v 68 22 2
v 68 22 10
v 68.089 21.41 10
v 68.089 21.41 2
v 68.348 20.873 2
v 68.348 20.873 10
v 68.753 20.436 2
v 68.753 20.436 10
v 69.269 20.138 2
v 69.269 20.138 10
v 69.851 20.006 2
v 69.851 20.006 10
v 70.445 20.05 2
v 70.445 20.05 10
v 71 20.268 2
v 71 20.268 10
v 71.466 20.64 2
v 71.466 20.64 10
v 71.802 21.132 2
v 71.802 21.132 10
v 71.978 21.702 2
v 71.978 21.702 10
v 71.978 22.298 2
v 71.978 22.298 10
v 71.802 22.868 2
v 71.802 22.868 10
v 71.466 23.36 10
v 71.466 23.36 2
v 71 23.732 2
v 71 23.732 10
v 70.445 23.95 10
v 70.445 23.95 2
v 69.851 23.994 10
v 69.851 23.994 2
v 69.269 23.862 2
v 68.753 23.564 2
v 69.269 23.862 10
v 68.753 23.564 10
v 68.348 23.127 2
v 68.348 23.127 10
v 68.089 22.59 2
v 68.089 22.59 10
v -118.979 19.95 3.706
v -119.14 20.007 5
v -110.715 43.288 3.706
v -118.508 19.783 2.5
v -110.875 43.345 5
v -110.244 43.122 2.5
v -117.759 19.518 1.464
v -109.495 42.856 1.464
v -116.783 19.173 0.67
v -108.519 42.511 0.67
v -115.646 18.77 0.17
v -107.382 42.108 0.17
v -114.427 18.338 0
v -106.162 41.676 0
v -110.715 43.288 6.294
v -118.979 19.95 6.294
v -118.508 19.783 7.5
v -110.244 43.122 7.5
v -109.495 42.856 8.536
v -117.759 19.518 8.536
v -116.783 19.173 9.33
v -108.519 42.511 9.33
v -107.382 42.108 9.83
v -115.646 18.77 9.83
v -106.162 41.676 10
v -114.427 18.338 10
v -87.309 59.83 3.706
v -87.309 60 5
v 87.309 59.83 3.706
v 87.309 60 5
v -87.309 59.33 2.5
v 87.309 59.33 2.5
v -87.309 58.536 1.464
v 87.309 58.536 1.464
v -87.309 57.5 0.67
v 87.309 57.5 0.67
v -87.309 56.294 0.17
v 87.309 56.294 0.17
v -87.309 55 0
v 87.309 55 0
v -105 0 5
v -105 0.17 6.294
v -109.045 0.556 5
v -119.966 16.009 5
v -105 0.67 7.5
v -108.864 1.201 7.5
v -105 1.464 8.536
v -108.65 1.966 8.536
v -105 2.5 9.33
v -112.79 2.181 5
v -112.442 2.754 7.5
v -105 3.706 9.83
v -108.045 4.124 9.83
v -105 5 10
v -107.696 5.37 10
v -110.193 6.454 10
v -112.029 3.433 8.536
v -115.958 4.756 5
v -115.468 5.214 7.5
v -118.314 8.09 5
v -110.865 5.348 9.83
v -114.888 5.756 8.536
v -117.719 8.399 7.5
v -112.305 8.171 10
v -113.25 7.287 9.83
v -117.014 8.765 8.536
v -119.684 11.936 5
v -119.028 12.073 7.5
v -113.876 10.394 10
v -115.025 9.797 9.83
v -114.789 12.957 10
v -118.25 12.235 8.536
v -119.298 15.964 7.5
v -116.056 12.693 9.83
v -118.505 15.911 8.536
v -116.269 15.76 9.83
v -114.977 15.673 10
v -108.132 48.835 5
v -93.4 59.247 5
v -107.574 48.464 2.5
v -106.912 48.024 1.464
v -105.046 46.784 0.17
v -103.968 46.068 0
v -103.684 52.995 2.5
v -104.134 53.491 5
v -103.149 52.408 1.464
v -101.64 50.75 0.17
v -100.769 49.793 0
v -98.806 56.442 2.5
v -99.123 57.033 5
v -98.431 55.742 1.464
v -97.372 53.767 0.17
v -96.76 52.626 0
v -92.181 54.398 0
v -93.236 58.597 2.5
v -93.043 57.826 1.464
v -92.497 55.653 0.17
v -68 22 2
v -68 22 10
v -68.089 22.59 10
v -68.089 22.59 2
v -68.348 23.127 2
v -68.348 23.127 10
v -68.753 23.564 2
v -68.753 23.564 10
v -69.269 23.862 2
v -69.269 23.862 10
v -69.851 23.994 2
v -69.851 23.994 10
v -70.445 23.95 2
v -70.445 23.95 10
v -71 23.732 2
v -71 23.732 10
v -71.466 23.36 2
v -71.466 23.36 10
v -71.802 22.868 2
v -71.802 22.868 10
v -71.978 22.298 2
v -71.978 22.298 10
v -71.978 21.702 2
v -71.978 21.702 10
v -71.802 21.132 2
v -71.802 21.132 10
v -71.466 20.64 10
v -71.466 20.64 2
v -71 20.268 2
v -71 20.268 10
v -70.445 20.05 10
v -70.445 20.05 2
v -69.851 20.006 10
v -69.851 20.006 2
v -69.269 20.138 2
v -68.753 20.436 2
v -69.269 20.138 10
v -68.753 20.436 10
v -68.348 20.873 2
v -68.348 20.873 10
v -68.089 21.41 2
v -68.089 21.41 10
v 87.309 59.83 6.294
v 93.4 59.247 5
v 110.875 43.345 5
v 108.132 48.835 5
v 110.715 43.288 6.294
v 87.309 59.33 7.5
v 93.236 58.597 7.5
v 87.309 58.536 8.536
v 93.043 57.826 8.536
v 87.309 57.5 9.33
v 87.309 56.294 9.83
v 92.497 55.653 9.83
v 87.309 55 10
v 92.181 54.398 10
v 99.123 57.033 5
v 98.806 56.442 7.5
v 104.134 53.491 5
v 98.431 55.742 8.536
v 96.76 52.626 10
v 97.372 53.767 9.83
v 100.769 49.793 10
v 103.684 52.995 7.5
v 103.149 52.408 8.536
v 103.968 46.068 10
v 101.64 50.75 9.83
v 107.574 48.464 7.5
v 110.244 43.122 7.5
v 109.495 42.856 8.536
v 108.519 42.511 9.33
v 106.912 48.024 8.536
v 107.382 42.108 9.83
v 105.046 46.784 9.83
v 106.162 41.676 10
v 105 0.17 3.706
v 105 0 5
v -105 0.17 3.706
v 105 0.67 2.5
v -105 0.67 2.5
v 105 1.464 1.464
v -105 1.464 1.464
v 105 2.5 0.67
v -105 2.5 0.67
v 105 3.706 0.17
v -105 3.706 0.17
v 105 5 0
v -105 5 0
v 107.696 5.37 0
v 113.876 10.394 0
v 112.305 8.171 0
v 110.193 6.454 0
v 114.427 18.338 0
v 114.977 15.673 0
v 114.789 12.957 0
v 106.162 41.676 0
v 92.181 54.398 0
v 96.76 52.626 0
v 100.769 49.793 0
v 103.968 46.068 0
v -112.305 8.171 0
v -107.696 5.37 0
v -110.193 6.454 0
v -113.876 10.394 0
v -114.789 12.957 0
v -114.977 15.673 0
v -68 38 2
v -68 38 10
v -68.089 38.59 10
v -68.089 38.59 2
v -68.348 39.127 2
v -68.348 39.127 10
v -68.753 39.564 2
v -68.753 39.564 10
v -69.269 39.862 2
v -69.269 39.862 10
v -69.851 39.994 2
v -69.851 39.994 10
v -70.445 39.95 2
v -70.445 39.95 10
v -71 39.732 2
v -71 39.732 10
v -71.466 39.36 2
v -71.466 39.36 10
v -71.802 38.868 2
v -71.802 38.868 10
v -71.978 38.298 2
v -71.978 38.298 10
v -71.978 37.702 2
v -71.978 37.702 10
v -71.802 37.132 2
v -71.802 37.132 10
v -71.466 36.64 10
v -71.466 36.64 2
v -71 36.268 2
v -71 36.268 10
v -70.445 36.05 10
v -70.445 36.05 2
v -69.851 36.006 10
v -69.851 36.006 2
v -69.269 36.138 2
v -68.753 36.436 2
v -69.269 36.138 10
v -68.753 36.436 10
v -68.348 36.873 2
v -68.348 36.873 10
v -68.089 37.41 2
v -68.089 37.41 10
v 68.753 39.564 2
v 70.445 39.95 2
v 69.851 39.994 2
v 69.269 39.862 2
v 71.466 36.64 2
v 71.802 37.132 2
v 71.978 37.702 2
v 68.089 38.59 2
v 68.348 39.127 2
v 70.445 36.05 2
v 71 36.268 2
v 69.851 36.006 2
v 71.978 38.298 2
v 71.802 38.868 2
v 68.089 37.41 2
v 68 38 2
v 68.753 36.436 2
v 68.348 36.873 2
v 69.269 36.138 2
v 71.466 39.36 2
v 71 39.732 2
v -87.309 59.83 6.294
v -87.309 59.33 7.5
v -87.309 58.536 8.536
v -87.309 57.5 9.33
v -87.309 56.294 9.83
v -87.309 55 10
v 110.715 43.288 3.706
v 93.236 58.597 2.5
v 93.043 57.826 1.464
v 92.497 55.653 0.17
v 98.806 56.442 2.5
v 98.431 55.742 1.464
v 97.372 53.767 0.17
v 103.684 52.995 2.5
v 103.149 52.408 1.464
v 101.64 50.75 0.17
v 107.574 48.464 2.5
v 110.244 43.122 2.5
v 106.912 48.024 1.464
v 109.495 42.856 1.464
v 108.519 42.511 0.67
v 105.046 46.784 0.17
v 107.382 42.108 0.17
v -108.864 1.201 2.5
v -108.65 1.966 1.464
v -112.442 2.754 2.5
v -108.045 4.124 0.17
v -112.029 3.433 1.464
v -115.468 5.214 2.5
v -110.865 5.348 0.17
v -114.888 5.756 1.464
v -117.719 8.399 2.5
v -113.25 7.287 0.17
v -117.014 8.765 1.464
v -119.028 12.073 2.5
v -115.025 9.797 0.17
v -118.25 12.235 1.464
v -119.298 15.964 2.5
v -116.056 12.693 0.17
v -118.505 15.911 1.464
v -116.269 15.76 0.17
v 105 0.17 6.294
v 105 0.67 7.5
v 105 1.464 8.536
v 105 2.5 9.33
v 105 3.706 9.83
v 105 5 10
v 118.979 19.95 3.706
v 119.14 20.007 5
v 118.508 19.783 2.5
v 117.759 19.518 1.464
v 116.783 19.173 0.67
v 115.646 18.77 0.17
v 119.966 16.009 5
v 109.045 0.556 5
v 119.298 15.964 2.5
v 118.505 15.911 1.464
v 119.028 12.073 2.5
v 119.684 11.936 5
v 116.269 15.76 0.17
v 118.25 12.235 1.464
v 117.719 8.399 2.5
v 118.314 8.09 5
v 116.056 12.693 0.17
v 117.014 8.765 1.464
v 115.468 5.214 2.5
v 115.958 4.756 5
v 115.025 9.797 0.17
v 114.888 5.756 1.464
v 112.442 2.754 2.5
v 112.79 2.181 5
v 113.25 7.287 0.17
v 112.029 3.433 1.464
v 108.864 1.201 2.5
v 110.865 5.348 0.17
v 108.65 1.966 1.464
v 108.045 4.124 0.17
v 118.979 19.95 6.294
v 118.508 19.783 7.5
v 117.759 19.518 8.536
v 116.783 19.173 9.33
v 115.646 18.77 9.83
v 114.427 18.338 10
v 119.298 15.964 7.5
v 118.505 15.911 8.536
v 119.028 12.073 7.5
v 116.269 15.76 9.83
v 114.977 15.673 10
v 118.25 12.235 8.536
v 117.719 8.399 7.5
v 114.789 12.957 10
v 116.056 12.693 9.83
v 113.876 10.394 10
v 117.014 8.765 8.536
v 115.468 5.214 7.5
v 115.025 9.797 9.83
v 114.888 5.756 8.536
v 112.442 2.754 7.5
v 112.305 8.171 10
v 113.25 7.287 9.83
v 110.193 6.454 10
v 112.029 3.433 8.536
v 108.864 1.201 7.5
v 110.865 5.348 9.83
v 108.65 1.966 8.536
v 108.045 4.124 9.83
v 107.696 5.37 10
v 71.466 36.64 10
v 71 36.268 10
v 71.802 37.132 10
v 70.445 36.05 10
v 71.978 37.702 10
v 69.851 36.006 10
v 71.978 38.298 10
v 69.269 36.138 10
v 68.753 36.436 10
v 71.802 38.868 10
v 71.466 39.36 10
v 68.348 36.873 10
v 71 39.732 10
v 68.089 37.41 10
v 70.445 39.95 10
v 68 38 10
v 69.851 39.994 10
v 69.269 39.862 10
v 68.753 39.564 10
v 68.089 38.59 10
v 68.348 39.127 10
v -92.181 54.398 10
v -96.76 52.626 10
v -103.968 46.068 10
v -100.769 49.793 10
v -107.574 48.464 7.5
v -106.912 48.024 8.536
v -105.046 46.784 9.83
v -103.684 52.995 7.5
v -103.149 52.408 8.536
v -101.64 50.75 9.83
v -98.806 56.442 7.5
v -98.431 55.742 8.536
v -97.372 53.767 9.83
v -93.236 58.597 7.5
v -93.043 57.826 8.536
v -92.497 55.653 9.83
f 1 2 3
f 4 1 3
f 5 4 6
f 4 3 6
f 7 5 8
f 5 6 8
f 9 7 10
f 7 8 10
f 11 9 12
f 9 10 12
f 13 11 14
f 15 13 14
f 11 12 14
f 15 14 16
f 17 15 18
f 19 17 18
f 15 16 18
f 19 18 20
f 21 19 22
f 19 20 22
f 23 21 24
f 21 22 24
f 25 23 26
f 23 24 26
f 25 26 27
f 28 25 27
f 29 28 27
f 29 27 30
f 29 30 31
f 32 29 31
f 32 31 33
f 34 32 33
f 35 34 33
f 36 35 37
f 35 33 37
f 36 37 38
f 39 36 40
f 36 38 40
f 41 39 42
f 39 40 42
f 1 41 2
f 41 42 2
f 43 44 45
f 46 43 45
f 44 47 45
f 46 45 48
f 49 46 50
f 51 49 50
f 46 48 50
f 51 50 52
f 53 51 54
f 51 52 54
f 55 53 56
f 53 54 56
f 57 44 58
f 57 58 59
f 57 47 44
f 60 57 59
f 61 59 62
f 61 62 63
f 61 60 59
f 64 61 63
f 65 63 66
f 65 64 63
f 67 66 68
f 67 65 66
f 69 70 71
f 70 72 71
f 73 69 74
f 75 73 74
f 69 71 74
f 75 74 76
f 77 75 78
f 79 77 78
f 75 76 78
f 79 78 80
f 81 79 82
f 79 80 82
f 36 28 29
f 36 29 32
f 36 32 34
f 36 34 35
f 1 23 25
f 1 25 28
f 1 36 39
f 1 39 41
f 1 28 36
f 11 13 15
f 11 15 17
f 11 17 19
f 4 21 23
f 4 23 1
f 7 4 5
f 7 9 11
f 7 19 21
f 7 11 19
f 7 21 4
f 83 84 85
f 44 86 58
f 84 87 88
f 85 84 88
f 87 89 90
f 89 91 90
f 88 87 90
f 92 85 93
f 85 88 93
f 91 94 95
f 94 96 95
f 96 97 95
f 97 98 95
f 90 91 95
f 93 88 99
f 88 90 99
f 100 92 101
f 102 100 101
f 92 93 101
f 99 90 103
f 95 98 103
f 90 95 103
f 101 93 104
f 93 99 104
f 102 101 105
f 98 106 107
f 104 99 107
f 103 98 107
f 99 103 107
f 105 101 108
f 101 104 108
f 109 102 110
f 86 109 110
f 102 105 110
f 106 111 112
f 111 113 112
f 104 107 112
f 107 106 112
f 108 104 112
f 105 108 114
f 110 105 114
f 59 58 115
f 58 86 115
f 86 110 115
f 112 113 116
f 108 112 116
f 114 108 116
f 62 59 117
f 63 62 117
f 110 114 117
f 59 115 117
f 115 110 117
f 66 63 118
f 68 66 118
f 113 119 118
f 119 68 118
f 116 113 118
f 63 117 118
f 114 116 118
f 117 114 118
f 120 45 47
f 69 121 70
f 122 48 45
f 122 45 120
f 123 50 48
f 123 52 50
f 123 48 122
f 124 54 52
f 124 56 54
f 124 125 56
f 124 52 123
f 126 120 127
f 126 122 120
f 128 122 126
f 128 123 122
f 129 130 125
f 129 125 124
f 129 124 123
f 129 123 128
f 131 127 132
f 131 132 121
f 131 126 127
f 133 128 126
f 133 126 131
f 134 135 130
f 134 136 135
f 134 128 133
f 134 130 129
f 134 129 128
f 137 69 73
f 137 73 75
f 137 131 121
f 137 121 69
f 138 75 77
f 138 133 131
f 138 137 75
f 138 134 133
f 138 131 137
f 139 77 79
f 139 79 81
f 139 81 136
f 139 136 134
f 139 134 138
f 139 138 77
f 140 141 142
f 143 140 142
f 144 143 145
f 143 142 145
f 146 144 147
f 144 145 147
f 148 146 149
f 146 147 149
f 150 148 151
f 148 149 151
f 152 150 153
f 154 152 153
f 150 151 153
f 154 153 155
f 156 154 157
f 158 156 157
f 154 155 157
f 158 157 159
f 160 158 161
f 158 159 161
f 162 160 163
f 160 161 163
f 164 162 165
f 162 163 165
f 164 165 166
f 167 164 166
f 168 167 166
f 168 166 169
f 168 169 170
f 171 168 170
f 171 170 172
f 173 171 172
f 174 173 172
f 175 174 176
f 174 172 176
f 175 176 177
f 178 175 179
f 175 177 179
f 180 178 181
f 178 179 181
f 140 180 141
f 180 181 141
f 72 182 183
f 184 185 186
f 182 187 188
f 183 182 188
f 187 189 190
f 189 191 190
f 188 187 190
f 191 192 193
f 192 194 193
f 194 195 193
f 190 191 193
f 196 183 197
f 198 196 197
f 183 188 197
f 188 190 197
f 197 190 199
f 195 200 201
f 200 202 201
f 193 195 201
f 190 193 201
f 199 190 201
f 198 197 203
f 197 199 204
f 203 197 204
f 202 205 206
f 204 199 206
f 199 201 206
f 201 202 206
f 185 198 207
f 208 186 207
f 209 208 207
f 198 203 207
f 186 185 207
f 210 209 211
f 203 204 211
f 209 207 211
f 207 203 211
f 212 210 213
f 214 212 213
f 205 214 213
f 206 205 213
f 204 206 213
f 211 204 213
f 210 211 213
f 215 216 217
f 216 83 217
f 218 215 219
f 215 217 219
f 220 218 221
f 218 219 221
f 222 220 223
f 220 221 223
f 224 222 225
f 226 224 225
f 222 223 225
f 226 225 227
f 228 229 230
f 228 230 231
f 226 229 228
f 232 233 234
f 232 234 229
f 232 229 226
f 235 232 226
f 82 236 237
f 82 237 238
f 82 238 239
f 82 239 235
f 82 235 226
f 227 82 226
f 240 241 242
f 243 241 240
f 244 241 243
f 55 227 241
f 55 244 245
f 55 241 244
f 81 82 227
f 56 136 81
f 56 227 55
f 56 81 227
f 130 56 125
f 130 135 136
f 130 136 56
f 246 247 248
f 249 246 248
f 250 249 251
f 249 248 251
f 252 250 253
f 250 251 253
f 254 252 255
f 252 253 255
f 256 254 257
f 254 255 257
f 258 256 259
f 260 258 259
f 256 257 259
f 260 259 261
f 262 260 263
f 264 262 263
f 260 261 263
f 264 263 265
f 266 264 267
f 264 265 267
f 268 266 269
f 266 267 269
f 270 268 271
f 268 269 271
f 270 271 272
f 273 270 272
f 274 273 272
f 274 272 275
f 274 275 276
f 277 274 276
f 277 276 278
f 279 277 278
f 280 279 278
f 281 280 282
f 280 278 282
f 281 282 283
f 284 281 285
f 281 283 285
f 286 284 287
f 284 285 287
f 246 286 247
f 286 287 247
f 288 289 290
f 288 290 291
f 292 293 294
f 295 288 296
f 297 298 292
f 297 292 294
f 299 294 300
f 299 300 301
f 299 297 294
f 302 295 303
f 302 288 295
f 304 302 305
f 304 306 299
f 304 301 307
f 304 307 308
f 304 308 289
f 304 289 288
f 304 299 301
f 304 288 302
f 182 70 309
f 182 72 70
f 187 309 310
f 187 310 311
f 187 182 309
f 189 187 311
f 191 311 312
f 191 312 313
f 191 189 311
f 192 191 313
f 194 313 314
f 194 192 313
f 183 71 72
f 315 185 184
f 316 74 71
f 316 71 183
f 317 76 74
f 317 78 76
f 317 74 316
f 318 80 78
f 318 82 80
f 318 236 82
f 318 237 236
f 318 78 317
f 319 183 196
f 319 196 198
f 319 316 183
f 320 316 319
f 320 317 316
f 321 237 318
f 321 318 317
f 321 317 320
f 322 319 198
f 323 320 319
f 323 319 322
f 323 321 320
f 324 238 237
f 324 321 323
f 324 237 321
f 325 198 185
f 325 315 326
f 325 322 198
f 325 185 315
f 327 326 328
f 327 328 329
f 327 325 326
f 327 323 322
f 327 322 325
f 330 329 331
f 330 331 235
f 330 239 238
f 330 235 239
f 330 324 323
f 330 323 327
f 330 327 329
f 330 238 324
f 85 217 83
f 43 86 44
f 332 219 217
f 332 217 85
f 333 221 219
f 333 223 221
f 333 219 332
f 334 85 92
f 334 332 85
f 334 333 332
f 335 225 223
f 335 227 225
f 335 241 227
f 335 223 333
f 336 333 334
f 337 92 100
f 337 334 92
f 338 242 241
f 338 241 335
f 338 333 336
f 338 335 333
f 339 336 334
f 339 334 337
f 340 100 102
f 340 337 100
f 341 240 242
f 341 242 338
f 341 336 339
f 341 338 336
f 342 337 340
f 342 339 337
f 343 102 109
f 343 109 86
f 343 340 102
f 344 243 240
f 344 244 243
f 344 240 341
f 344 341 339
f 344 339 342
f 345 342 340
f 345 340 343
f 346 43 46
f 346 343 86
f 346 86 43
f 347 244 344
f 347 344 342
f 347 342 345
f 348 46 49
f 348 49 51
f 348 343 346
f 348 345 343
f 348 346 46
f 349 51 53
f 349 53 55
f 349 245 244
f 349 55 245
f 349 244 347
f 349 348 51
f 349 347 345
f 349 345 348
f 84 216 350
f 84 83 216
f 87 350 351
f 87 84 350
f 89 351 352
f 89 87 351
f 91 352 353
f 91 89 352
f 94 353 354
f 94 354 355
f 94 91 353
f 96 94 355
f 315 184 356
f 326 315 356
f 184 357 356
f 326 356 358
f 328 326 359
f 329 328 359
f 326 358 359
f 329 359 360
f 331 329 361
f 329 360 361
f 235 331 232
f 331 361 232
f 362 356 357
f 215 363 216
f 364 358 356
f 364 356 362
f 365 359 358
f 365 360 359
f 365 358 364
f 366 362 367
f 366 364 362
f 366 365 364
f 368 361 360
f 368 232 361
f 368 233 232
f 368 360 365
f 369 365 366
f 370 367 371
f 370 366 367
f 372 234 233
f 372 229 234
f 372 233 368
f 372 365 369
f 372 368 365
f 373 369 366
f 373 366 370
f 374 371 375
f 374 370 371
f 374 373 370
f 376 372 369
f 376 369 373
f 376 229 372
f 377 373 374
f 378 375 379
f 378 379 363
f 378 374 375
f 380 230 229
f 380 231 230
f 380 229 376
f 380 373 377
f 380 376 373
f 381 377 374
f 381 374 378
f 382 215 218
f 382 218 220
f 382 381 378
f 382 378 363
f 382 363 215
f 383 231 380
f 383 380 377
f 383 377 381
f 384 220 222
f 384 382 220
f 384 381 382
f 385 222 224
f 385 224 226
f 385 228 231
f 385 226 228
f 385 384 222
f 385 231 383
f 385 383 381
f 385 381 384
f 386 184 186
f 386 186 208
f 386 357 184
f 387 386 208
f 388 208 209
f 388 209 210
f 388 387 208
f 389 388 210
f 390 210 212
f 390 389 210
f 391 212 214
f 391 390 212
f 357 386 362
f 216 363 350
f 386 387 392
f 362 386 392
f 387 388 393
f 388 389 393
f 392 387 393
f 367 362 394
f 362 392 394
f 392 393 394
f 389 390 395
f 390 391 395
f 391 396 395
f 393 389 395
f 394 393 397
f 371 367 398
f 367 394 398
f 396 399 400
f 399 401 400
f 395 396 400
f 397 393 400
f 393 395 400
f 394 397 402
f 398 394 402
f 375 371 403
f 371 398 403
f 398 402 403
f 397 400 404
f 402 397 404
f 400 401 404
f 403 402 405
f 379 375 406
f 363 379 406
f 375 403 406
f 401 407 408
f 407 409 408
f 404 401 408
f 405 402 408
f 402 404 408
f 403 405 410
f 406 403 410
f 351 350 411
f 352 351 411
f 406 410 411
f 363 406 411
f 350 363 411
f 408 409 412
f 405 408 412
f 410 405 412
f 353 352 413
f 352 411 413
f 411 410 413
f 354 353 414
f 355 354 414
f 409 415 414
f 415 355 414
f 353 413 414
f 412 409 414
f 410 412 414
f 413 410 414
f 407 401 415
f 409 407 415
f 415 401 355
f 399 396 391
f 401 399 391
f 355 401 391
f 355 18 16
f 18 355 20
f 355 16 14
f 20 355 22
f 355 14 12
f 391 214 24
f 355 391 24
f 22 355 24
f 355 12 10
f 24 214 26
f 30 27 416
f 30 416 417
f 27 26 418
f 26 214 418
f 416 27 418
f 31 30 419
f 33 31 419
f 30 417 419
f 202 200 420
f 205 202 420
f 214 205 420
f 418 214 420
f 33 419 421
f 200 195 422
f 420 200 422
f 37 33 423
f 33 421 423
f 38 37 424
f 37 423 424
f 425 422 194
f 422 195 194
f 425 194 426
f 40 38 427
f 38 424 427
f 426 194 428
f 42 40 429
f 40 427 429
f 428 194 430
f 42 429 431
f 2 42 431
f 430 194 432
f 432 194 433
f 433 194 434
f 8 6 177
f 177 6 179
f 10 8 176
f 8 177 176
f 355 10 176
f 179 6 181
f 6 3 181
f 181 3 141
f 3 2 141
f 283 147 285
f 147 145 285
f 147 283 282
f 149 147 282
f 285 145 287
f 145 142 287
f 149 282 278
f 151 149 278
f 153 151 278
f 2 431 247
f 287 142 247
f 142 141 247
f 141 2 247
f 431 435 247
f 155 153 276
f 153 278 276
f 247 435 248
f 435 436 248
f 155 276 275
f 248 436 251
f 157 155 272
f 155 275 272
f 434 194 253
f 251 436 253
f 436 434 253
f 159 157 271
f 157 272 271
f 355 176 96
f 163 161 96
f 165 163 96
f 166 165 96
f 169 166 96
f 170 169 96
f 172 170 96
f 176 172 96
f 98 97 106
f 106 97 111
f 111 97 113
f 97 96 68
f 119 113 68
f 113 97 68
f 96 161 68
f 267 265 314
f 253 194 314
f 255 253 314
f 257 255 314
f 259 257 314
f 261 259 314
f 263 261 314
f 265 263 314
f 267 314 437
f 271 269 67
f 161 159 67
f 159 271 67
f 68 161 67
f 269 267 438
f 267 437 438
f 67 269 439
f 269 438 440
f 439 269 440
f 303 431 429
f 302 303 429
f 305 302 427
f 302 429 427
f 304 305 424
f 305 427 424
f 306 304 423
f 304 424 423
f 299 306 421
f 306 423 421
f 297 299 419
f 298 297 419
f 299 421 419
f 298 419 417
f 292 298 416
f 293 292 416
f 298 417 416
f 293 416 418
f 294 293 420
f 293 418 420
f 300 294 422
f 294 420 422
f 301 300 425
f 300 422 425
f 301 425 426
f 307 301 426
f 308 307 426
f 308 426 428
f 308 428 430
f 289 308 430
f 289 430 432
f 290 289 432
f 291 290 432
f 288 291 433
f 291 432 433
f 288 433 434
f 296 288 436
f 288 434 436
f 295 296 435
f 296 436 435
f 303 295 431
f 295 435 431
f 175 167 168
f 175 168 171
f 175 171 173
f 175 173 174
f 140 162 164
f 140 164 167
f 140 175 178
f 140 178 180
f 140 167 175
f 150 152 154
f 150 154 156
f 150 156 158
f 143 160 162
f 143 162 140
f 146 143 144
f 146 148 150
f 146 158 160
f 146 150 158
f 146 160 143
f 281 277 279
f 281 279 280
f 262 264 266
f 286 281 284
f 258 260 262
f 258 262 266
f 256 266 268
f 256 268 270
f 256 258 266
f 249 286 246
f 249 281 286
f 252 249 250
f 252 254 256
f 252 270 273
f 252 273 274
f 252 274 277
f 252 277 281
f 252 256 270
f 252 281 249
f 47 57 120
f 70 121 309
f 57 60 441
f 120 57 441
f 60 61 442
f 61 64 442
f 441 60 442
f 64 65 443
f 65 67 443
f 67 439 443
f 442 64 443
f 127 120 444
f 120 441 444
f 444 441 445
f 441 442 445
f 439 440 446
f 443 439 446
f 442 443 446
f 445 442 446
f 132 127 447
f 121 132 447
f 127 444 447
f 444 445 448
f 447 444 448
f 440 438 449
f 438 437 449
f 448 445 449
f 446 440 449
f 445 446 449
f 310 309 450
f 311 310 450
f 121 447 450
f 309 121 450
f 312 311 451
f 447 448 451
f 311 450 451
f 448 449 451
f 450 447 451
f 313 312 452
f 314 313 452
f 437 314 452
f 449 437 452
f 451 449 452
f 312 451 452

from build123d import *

# Parameters (mm, degrees)
BOSS_EXTRUDE1_DEPTH = 10
SKETCH2_R           = 2
CUT_EXTRUDE1_DEPTH  = 8
FILLET1_R           = 5


with BuildPart() as part:
    # Sketch1 → Boss-Extrude1 (new body)
    with BuildSketch(Plane.XY):
        with BuildLine():
            Line((0, 0), (-105, 0))
            ThreePointArc((-105, 0), (-117.249623327, 6.342822149), (-119.139622366, 20.007102889))
            Line((-119.139622366, 20.007102889), (-110.875178831, 43.345171481))
            ThreePointArc((-110.875178831, 43.345171481), (-101.737771304, 55.416038879), (-87.309141554, 60))
            Line((-87.309141554, 60), (87.309141554, 60))
            ThreePointArc((87.309141554, 60), (101.737771304, 55.416038879), (110.875178831, 43.345171481))
            Line((110.875178831, 43.345171481), (119.139622366, 20.007102889))
            ThreePointArc((119.139622366, 20.007102889), (117.249623327, 6.342822149), (105, 0))
            Line((105, 0), (0, 0))
        make_face()
    extrude(amount=BOSS_EXTRUDE1_DEPTH)

    # Sketch2 → Cut-Extrude1 (cut)
    with BuildSketch(Plane.XY.offset(10)):
        with Locations((-70, 22)):
            Circle(SKETCH2_R)
        with Locations((-70, 38)):
            Circle(SKETCH2_R)
        with Locations(Location((70, 22, 0), (0, 0, 180))):
            Circle(SKETCH2_R)
        with Locations(Location((70, 38, 0), (0, 0, 180))):
            Circle(SKETCH2_R)
    extrude(amount=-CUT_EXTRUDE1_DEPTH, mode=Mode.SUBTRACT)

    # Fillet1
    fillet1_edges = [part.edges().sort_by_distance(p)[0] for p in [
        (-117.249623327, 6.342822149, 0),
        (-115.007400599, 31.676137185, 0),
        (-101.737771304, 55.416038879, 0),
        (0, 60, 0),
        (101.737771304, 55.416038879, 0),
        (115.007400599, 31.676137185, 0),
        (117.249623327, 6.342822149, 0),
        (-117.249623327, 6.342822149, 10),
        (-115.007400599, 31.676137185, 10),
        (-101.737771304, 55.416038879, 10),
        (0, 60, 10),
        (101.737771304, 55.416038879, 10),
        (115.007400599, 31.676137185, 10),
        (117.249623327, 6.342822149, 10),
        (0, 0, 0),
        (0, 0, 10),
    ]]
    fillet(fillet1_edges, radius=FILLET1_R - 0.0001)  # a hair under: the kernel refuses the full size


solid = part.part
